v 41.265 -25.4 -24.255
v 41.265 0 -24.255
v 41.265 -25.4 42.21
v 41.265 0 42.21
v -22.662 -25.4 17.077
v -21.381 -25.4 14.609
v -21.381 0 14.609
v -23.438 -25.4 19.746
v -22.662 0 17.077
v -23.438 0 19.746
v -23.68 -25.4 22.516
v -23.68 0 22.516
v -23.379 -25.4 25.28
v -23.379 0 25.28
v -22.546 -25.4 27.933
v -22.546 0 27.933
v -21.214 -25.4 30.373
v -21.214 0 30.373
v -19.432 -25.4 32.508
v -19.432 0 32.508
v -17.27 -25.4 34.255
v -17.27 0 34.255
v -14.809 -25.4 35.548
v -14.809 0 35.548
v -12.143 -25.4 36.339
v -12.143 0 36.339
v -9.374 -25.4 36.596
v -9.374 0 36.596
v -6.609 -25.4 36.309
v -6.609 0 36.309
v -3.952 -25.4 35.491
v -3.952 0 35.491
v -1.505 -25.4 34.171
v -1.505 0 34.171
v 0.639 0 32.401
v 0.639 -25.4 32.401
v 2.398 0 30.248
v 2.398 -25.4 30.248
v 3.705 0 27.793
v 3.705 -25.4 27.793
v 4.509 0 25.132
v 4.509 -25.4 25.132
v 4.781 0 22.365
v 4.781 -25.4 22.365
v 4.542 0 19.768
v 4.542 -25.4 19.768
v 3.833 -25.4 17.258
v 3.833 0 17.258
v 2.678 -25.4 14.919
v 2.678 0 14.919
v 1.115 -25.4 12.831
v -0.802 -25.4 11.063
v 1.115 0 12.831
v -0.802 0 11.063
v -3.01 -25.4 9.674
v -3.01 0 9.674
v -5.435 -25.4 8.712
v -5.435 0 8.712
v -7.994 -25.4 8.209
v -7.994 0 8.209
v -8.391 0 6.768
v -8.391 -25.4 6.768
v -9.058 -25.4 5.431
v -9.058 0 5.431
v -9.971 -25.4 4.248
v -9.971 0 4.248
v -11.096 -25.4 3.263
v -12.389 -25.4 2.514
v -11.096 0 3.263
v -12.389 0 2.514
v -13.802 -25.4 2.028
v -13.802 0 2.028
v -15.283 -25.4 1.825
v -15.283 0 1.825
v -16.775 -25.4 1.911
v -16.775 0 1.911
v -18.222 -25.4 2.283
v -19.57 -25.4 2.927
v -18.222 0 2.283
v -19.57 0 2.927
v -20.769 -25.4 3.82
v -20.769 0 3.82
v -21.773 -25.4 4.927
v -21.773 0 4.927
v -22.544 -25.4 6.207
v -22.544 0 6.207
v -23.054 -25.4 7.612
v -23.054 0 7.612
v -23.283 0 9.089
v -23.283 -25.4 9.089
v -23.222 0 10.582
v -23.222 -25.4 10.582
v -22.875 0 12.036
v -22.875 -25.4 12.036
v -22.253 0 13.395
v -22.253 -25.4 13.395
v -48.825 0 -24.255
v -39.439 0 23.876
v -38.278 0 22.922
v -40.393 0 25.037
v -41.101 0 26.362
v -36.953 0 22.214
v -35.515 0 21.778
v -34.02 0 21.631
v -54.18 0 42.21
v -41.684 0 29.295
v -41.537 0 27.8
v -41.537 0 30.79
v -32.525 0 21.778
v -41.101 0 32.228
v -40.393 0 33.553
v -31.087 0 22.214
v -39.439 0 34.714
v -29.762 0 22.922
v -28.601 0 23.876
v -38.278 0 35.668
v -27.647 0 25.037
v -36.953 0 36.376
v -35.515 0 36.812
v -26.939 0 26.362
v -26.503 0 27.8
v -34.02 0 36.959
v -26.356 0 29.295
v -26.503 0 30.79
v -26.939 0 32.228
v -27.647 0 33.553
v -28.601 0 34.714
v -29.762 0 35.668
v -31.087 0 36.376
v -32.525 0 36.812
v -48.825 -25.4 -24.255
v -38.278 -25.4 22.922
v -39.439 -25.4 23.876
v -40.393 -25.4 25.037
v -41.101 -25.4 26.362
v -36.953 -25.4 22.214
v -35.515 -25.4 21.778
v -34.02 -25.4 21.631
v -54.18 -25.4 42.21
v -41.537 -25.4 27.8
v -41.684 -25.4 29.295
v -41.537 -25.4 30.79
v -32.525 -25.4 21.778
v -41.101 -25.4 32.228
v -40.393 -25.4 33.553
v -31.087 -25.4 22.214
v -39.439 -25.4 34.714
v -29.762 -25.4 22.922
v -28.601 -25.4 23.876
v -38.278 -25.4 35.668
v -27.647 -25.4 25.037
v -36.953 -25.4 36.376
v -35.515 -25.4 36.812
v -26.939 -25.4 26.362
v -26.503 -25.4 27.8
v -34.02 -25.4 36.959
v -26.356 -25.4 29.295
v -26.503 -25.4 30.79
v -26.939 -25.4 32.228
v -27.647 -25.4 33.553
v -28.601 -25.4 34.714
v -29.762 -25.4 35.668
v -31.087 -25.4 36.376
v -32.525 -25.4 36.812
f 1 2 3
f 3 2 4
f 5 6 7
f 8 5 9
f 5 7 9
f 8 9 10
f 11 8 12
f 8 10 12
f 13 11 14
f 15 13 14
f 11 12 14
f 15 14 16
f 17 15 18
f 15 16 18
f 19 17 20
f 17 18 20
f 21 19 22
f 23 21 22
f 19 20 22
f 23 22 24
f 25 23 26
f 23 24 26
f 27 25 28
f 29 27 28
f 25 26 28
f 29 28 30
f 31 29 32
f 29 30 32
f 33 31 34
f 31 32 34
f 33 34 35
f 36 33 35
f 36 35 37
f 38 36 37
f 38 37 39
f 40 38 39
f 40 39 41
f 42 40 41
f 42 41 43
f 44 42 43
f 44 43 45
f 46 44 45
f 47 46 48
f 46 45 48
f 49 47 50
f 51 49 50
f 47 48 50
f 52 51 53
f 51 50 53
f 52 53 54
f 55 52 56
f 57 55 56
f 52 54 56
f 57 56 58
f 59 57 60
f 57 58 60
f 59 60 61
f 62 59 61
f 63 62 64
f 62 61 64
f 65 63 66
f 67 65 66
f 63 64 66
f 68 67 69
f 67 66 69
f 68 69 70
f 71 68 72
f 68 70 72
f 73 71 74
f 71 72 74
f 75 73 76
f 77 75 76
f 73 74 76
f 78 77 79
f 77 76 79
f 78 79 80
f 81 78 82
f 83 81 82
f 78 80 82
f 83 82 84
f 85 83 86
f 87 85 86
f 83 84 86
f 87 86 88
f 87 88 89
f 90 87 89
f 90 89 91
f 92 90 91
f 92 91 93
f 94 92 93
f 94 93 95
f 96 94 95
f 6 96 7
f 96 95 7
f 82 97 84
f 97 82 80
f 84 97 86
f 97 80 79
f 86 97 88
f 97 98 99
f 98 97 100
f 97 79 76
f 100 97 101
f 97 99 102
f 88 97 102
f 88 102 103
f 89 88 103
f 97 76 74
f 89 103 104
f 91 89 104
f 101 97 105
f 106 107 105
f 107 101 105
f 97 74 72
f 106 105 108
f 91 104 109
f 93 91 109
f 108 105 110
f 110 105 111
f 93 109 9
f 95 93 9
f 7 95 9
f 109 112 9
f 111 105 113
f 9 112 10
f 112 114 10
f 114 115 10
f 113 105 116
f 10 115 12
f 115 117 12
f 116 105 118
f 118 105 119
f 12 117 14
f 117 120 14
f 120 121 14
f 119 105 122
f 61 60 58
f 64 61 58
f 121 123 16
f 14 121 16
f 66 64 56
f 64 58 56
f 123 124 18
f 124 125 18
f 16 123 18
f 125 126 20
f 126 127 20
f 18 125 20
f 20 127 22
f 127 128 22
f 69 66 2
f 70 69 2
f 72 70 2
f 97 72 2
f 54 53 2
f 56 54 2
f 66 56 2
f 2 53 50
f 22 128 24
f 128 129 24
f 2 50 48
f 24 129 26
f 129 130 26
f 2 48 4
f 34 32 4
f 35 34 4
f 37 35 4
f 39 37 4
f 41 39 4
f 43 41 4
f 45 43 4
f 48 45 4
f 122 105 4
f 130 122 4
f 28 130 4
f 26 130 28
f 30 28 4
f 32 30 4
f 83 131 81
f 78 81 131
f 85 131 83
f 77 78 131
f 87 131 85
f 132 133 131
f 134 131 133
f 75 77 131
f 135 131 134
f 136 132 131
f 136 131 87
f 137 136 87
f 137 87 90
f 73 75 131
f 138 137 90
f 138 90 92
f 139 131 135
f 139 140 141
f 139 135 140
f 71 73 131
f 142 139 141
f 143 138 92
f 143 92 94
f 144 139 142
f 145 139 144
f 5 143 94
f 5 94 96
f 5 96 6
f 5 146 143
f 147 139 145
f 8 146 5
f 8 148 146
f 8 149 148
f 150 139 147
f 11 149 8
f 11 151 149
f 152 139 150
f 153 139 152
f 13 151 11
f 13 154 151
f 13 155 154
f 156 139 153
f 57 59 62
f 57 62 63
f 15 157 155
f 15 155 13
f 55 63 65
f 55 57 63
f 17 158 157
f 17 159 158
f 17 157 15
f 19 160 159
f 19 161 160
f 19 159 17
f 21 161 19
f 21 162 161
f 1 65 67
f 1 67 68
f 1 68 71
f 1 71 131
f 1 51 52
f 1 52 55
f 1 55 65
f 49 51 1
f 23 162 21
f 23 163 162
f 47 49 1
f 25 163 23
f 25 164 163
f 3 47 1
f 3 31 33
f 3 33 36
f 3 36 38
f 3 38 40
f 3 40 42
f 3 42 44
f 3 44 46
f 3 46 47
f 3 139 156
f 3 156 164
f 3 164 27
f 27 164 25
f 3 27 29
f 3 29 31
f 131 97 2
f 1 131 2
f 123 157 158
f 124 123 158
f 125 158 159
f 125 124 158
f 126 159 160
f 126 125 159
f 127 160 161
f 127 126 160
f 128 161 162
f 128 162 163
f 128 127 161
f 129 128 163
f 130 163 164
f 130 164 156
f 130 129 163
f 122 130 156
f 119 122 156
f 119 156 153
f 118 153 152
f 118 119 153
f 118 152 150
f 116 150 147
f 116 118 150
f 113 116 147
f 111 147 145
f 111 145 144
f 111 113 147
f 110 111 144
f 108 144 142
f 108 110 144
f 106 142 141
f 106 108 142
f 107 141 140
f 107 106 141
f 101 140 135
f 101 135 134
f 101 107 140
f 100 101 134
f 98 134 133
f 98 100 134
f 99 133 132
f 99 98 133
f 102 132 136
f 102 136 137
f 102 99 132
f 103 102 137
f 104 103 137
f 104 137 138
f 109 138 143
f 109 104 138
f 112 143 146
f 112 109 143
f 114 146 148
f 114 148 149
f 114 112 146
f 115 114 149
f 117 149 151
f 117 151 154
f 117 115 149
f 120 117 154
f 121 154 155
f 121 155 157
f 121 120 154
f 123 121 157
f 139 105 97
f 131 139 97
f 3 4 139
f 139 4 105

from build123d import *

# Parameters (mm, degrees)
F0_R     = 7.664283
F1_DEPTH = 25.4


with BuildPart() as f1:
    # F0 (on Front) → F1 (new body)
    with BuildSketch(Plane.XZ):
        Polygon((41.265003, 42.209998), (-54.18, 42.209998), (-48.824999, -24.255), (41.265003, -24.255), align=None)
        with BuildLine():
            ThreePointArc((-21.381332, 14.608613), (-13.495042, 36.008892), (4.780889, 22.364998))
            ThreePointArc((4.780889, 22.364998), (1.11502, 12.830925), (-7.993936, 8.208795))
            ThreePointArc((-7.993936, 8.208795), (-18.911873, 2.57227), (-21.381332, 14.608613))
        make_face(mode=Mode.SUBTRACT)
        with Locations((-34.019999, 29.295001)):
            Circle(F0_R, mode=Mode.SUBTRACT)
    extrude(amount=F1_DEPTH)


solid = f1.part
